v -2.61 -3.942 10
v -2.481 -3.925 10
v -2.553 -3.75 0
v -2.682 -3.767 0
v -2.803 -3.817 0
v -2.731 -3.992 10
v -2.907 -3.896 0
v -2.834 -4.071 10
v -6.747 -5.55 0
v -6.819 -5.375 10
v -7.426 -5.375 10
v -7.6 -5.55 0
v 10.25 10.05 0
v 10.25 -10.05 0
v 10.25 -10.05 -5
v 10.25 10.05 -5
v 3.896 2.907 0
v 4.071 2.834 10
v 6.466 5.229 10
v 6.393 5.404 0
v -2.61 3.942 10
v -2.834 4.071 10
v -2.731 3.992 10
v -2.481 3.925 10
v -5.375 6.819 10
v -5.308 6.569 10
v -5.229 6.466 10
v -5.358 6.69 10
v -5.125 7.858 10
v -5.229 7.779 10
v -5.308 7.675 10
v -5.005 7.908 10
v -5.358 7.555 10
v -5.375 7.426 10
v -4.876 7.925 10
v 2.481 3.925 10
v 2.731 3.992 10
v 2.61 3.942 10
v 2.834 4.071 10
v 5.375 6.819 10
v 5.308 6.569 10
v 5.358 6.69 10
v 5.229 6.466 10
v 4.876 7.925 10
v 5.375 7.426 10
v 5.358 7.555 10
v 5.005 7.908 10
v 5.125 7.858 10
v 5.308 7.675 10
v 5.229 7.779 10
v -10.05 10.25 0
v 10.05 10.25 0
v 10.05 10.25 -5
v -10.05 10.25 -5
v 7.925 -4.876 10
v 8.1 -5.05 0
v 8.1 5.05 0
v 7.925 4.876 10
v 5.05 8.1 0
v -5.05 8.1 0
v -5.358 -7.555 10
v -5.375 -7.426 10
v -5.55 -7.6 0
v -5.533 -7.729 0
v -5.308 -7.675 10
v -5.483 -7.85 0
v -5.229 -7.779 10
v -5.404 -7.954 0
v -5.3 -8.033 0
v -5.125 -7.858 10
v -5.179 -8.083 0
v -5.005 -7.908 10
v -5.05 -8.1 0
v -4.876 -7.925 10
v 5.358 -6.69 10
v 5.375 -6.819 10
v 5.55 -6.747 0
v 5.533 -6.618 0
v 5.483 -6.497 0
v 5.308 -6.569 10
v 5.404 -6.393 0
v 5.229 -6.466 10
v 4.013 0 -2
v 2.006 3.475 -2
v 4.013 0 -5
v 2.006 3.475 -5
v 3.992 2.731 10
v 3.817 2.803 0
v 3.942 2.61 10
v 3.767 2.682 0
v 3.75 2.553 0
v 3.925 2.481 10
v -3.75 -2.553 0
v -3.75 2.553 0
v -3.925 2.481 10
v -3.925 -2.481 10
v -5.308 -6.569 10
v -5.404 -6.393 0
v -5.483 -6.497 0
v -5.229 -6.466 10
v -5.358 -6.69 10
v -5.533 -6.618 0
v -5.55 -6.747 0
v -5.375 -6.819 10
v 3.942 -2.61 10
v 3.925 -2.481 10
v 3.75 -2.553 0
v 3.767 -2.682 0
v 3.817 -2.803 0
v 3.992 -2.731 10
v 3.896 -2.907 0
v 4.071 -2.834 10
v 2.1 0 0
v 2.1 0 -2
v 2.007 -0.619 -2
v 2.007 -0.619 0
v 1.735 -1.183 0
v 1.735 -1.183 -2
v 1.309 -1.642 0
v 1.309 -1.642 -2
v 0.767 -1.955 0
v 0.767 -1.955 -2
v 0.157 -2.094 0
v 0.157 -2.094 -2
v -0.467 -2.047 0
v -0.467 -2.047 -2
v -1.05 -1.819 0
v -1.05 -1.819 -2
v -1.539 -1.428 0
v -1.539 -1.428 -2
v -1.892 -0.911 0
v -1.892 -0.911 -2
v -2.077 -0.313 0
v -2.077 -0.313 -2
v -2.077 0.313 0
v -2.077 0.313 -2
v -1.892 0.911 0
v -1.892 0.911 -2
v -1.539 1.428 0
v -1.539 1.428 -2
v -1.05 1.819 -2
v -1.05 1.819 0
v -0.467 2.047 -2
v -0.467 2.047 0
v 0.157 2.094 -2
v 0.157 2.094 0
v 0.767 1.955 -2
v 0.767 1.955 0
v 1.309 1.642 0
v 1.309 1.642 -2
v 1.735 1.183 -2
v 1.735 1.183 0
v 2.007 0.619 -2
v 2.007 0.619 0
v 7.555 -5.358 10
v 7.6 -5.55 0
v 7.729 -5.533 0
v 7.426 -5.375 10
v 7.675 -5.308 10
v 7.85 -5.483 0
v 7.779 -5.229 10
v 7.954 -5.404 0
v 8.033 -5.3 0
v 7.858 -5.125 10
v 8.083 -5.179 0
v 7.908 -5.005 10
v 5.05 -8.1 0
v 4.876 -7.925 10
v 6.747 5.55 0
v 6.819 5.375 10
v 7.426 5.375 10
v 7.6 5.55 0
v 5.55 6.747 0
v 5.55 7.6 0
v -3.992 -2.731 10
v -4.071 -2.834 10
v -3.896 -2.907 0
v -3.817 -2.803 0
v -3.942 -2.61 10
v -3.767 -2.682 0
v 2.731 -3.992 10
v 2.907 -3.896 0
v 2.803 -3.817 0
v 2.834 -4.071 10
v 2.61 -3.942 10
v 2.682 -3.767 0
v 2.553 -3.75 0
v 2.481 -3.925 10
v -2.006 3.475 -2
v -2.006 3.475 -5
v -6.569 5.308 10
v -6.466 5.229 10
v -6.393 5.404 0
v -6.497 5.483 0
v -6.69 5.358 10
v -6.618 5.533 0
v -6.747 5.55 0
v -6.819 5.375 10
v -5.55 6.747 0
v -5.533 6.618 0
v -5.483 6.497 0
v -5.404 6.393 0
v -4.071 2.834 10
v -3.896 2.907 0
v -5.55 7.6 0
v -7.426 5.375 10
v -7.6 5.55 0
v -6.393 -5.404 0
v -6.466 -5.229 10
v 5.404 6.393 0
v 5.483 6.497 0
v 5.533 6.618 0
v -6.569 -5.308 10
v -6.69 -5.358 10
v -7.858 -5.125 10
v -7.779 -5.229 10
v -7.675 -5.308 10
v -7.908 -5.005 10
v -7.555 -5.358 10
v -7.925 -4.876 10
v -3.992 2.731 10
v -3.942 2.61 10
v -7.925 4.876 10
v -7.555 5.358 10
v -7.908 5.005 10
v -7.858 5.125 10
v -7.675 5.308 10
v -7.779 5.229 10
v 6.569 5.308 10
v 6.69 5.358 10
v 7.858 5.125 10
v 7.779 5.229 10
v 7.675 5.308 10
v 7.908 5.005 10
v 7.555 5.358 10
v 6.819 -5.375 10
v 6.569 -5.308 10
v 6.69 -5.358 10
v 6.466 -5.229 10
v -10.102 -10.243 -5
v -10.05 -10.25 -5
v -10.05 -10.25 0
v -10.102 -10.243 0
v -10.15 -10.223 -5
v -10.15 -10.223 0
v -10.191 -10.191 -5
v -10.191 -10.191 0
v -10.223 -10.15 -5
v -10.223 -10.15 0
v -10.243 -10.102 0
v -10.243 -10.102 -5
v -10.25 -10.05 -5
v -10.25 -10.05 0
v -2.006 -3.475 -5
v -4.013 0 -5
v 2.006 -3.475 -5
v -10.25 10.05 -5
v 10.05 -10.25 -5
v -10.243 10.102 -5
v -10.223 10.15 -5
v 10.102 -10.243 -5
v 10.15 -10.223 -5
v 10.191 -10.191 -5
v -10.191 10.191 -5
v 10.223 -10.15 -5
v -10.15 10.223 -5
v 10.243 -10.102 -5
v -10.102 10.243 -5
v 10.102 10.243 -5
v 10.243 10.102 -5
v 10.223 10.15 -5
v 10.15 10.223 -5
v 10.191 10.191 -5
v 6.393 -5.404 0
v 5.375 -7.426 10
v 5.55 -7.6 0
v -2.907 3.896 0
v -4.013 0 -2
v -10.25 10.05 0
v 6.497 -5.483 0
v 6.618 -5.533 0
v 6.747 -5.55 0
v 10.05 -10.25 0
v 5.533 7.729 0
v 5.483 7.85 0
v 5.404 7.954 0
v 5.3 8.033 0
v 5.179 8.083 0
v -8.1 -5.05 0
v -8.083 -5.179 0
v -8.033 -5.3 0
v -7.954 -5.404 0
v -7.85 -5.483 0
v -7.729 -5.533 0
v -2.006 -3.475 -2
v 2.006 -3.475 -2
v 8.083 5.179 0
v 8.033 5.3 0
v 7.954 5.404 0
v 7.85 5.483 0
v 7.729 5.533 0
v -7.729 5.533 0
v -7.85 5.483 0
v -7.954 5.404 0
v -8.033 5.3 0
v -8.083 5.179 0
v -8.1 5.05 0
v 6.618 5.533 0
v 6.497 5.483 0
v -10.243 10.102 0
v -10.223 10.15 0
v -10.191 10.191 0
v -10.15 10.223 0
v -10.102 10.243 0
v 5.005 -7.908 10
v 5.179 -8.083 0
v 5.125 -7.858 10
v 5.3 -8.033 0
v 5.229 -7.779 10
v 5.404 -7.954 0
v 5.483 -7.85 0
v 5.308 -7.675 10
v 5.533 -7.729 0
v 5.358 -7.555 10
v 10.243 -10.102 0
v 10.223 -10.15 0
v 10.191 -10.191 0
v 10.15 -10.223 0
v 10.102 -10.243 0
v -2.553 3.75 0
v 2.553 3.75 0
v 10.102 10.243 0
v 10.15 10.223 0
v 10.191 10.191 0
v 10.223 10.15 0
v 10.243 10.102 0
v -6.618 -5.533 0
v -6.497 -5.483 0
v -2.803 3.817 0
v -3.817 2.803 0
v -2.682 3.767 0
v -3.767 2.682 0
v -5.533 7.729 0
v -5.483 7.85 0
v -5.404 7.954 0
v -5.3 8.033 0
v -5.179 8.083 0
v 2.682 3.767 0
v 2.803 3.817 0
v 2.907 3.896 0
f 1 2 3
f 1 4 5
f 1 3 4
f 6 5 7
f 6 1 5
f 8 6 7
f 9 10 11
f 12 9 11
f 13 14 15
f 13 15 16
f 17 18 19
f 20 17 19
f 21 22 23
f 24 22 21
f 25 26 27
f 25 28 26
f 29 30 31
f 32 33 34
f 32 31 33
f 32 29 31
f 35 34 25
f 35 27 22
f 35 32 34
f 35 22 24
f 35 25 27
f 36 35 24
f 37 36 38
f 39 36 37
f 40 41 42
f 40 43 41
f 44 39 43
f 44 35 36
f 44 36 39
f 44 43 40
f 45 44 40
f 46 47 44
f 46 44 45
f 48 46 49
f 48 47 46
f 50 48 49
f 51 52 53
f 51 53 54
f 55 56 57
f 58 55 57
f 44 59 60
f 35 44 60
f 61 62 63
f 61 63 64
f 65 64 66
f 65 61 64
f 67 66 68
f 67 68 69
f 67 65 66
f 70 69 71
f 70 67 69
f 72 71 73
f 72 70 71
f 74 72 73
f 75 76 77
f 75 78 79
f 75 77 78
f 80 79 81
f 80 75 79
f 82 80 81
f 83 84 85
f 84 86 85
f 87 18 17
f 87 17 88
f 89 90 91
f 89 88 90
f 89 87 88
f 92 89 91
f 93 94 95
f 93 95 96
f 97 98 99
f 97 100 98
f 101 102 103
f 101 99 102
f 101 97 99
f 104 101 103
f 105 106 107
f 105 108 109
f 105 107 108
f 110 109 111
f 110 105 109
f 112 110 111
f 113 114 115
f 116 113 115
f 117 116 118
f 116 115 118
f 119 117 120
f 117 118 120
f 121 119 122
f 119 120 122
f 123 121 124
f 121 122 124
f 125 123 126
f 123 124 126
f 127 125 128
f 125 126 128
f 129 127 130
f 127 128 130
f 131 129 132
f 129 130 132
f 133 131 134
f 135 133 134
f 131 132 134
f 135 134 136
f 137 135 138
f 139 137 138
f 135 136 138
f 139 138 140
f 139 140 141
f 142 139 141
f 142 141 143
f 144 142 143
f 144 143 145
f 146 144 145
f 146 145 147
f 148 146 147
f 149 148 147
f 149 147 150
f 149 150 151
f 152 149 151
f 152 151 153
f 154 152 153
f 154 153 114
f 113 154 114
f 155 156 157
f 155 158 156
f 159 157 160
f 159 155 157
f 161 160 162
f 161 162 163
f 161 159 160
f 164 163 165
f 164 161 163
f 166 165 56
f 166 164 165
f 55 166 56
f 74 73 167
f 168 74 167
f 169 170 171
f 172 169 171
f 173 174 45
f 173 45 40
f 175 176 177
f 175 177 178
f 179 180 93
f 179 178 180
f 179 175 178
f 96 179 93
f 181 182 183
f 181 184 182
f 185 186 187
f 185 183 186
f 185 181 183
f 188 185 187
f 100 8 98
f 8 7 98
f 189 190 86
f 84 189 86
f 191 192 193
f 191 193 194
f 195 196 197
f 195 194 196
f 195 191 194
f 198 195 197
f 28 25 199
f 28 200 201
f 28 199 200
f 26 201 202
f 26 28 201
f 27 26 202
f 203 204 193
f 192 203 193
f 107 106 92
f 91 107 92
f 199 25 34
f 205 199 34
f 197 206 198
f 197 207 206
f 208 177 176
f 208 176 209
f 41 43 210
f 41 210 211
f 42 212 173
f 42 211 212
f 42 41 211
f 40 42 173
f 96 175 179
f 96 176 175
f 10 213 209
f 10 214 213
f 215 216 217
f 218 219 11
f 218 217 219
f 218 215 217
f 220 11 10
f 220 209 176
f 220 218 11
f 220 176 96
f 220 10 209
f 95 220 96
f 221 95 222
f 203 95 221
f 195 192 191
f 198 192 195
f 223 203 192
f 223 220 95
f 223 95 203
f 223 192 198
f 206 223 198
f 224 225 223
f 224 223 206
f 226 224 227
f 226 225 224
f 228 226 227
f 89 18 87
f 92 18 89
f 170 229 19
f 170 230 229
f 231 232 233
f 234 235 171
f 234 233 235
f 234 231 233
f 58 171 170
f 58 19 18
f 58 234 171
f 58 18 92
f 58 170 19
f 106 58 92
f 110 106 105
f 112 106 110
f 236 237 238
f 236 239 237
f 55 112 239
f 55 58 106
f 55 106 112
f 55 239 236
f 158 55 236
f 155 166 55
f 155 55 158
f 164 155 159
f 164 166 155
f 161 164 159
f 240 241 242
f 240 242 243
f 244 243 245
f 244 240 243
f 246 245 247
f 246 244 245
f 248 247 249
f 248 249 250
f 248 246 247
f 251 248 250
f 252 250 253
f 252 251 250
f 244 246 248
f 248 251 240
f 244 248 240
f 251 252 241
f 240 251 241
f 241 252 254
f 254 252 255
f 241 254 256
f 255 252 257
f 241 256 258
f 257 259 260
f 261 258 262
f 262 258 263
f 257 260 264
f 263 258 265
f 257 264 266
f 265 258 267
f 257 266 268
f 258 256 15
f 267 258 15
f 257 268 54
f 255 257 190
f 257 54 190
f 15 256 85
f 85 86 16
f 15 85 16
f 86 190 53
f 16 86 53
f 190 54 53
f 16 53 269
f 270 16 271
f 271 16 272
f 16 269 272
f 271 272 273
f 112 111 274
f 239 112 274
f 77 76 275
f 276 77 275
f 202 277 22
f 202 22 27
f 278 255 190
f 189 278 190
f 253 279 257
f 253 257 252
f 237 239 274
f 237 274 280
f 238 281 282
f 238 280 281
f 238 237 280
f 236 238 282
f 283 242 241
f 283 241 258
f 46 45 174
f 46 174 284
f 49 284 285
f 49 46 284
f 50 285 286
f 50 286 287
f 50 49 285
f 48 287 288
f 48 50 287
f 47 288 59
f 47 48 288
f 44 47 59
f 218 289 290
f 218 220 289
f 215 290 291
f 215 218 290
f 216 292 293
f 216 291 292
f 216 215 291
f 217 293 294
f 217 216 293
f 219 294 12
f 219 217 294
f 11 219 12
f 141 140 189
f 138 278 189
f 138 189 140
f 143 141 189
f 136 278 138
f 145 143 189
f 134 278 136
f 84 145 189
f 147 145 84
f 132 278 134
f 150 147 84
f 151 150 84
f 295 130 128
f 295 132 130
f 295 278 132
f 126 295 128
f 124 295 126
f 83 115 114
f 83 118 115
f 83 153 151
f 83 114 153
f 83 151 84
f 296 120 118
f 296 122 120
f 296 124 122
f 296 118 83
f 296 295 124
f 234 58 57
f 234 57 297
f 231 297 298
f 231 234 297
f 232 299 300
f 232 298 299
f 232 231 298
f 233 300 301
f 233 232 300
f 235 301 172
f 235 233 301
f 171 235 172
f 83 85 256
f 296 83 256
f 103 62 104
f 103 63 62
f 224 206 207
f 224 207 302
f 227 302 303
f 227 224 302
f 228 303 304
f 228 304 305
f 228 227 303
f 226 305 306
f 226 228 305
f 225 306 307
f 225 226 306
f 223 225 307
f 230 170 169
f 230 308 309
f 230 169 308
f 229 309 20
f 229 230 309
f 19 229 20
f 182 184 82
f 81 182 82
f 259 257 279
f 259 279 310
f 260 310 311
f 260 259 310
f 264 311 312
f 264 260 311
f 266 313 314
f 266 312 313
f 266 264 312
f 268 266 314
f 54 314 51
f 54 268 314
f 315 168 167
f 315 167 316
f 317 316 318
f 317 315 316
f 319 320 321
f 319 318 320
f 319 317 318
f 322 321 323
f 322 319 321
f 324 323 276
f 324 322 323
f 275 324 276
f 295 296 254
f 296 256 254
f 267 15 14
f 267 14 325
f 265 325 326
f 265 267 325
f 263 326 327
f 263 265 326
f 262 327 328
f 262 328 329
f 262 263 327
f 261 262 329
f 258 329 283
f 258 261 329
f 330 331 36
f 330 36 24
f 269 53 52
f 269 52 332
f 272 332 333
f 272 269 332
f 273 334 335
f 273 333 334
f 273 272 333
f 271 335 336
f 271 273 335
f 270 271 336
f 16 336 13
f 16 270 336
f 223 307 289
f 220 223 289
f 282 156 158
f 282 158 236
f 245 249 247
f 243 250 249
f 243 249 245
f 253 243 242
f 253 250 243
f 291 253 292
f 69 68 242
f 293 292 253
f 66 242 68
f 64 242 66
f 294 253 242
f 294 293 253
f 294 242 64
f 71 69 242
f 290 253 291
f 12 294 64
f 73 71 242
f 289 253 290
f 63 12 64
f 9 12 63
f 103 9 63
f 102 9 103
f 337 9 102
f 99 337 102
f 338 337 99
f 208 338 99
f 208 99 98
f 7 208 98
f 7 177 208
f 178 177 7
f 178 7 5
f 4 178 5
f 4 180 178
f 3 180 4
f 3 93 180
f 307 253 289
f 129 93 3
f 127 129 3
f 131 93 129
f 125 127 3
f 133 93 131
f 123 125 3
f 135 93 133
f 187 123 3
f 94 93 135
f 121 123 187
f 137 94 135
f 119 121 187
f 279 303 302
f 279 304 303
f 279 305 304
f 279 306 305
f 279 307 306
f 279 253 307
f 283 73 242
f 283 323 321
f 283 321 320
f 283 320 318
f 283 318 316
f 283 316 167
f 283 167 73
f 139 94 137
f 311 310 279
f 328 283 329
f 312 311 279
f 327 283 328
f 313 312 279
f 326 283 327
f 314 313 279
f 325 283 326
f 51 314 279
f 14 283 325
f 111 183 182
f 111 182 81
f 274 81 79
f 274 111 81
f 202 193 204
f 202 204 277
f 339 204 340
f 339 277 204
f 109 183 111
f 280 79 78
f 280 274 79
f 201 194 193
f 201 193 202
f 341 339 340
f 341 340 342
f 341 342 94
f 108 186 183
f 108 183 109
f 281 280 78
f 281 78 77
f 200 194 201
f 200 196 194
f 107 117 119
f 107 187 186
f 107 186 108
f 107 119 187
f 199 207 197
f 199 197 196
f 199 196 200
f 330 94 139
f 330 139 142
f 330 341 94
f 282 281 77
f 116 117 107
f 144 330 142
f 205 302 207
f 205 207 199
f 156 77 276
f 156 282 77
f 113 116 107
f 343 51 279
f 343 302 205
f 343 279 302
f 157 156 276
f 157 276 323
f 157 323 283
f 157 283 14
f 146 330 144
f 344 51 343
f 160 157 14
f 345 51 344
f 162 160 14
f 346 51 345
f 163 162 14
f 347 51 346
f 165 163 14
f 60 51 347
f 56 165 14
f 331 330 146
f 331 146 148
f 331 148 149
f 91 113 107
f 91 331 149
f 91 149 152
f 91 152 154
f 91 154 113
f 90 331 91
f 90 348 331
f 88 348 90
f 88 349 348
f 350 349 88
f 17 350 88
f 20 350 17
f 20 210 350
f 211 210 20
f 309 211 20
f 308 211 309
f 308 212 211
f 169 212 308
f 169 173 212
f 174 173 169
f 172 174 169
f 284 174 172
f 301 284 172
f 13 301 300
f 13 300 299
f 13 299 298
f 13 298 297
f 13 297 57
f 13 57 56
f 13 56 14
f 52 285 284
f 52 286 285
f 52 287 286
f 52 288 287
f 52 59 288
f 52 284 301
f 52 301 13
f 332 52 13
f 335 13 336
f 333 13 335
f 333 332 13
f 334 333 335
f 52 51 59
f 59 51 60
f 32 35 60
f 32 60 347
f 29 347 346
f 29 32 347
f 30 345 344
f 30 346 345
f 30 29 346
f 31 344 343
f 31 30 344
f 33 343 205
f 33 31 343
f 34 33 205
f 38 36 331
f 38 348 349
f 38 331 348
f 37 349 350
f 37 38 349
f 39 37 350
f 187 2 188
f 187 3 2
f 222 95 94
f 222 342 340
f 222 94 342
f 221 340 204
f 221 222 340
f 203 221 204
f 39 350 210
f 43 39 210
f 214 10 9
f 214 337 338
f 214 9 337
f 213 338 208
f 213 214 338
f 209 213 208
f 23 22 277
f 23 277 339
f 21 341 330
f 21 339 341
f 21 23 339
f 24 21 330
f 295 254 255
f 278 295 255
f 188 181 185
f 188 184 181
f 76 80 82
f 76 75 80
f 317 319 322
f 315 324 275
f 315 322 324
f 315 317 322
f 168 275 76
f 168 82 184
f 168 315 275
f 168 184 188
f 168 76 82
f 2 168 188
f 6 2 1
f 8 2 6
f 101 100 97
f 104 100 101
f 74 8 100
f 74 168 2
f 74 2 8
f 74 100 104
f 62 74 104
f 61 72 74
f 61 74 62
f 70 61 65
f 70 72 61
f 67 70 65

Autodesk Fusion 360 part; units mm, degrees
ref_plane "WorkPlane1" through (0, 0, 0) normal (0, 0, 1) x (1, 0, 0)
sketch "Sketch1" plane through (0, 0, 0) normal (0, 0, 1) x (1, 0, 0)
  line L0 (10.25, 10.25) -> (-10.25, 10.25)
  line L1 (-10.25, 10.25) -> (-10.25, -10.25)
  line L2 (-10.25, -10.25) -> (10.25, -10.25)
  line L3 (10.25, -10.25) -> (10.25, 10.25)
  line L4 (10.25, 10.25) -> (-10.25, -10.25) construction
  line L5 (-10.25, 10.25) -> (10.25, -10.25) construction
  line L6 (3.75, 3.75) -> (-3.75, 3.75)
  line L7 (-3.75, 3.75) -> (-3.75, -3.75)
  line L8 (-3.75, -3.75) -> (3.75, -3.75)
  line L9 (3.75, -3.75) -> (3.75, 3.75)
  line L10 (3.75, 3.75) -> (-3.75, -3.75) construction
  line L11 (-3.75, 3.75) -> (3.75, -3.75) construction
  line L12 (8.1, 8.1) -> (-8.1, 8.1)
  line L13 (-8.1, 8.1) -> (-8.1, -8.1)
  line L14 (-8.1, -8.1) -> (8.1, -8.1)
  line L15 (8.1, -8.1) -> (8.1, 8.1)
  line L16 (8.1, 8.1) -> (-8.1, -8.1) construction
  line L17 (-8.1, 8.1) -> (8.1, -8.1) construction
  line L18 (10.25, 10.25) -> (5.55, 10.25)
  line L19 (5.55, 10.25) -> (5.55, 5.55)
  line L20 (5.55, 5.55) -> (10.25, 5.55)
  line L21 (10.25, 5.55) -> (10.25, 10.25)
  line L22 (2.7601, 3.75) -> (5.55, 6.5399)
  line L23 (3.75, 2.7601) -> (6.5399, 5.55)
  line L24 (4.155, 5.145) -> (5.145, 4.155)
  line L25 (-5.55, 5.55) -> (-5.55, 10.25)
  line L26 (-10.25, 5.55) -> (-5.55, 5.55)
  line L27 (-3.75, 2.7601) -> (-6.5399, 5.55)
  line L28 (-2.7601, 3.75) -> (-5.55, 6.5399)
  line L29 (-5.55, -5.55) -> (-10.25, -5.55)
  line L30 (-5.55, -10.25) -> (-5.55, -5.55)
  line L31 (-2.7601, -3.75) -> (-5.55, -6.5399)
  line L32 (-3.75, -2.7601) -> (-6.5399, -5.55)
  line L33 (5.55, -5.55) -> (5.55, -10.25)
  line L34 (10.25, -5.55) -> (5.55, -5.55)
  line L35 (3.75, -2.7601) -> (6.5399, -5.55)
  line L36 (2.7601, -3.75) -> (5.55, -6.5399)
  point P0 (4.65, 4.65)
  dimension "d2" = 20.5
  dimension "d3" = 20.5
  dimension "d4" = 7.5
  dimension "d5" = 7.5
  dimension "d6" = 16.2
  dimension "d7" = 16.2
  dimension "d8" = 4.7
  dimension "d9" = 4.7
  dimension "d10" = 1.4
  dimension "d12" = 360
extrude "Extrude1" add sketch "Sketch1" against normal blind 5 makes body 1
extrude "Extrude2" add sketch "Sketch1" along normal blind 10 draft -1 separate body contours L6 L12 L19 L22 L25 L28 makes body 2
sketch "Sketch2" plane through (0, 0, -5) normal (0, 0, -1) x (1, 0, 0)
  line L0 (10.25, -10.25) -> (10.25, 10.25)
  line L1 (10.25, 10.25) -> (-10.25, 10.25)
  line L2 (-10.25, 10.25) -> (-10.25, -10.25)
  line L3 (-10.25, -10.25) -> (10.25, -10.25)
  circle A0 centre (0, 0) radius 2.1
  line L4 (2.0063, 3.475) -> (-2.0063, 3.475)
  line L5 (-2.0063, 3.475) -> (-4.0126, 0)
  line L6 (-4.0126, 0) -> (-2.0063, -3.475)
  line L7 (-2.0063, -3.475) -> (2.0063, -3.475)
  line L8 (2.0063, -3.475) -> (4.0126, 0)
  line L9 (4.0126, 0) -> (2.0063, 3.475)
  dimension "d17" = 4.2
  dimension "d18" = 3.475
extrude "Extrude3" cut sketch "Sketch2" against normal up to surface (5 mm away) contours A0 bodies 2 1
extrude "Extrude4" cut sketch "Sketch2" against normal blind 3 contours L4 L5 L6 L7 L8 L9 bodies 1 2
fillet "Fillet1" radius 0.5 6 edges at (2.7239, 3.8373, 5) (-2.7239, 3.8373, 5) (-5.4627, 6.5761, 5) (5.4627, 6.5761, 5) (5.4627, 8.0127, 5) (-5.4627, 8.0127, 5) on bodies 2
pattern_circular "C-Pattern1" count 4 over 360 about axis through (0, 0, 1.75) along (0, 0, 1) of bodies 2 makes body 3 at (-8.0418, 1.6252, 3.3333) makes body 4 at (-1.6252, -8.0418, 3.3333) makes body 5 at (8.0418, -1.6252, 3.3333)
combine "Combine1" operation add target body 5 tool bodies 4 3 2 1
fillet "Fillet2" radius 0.2 4 edges at (10.25, -10.25, -2.5) (10.25, 10.25, -2.5) (-10.25, 10.25, -2.5) (-10.25, -10.25, -2.5) on bodies 5
equation "d18 = ( 6.95 / 2 ) * 1 mm"
